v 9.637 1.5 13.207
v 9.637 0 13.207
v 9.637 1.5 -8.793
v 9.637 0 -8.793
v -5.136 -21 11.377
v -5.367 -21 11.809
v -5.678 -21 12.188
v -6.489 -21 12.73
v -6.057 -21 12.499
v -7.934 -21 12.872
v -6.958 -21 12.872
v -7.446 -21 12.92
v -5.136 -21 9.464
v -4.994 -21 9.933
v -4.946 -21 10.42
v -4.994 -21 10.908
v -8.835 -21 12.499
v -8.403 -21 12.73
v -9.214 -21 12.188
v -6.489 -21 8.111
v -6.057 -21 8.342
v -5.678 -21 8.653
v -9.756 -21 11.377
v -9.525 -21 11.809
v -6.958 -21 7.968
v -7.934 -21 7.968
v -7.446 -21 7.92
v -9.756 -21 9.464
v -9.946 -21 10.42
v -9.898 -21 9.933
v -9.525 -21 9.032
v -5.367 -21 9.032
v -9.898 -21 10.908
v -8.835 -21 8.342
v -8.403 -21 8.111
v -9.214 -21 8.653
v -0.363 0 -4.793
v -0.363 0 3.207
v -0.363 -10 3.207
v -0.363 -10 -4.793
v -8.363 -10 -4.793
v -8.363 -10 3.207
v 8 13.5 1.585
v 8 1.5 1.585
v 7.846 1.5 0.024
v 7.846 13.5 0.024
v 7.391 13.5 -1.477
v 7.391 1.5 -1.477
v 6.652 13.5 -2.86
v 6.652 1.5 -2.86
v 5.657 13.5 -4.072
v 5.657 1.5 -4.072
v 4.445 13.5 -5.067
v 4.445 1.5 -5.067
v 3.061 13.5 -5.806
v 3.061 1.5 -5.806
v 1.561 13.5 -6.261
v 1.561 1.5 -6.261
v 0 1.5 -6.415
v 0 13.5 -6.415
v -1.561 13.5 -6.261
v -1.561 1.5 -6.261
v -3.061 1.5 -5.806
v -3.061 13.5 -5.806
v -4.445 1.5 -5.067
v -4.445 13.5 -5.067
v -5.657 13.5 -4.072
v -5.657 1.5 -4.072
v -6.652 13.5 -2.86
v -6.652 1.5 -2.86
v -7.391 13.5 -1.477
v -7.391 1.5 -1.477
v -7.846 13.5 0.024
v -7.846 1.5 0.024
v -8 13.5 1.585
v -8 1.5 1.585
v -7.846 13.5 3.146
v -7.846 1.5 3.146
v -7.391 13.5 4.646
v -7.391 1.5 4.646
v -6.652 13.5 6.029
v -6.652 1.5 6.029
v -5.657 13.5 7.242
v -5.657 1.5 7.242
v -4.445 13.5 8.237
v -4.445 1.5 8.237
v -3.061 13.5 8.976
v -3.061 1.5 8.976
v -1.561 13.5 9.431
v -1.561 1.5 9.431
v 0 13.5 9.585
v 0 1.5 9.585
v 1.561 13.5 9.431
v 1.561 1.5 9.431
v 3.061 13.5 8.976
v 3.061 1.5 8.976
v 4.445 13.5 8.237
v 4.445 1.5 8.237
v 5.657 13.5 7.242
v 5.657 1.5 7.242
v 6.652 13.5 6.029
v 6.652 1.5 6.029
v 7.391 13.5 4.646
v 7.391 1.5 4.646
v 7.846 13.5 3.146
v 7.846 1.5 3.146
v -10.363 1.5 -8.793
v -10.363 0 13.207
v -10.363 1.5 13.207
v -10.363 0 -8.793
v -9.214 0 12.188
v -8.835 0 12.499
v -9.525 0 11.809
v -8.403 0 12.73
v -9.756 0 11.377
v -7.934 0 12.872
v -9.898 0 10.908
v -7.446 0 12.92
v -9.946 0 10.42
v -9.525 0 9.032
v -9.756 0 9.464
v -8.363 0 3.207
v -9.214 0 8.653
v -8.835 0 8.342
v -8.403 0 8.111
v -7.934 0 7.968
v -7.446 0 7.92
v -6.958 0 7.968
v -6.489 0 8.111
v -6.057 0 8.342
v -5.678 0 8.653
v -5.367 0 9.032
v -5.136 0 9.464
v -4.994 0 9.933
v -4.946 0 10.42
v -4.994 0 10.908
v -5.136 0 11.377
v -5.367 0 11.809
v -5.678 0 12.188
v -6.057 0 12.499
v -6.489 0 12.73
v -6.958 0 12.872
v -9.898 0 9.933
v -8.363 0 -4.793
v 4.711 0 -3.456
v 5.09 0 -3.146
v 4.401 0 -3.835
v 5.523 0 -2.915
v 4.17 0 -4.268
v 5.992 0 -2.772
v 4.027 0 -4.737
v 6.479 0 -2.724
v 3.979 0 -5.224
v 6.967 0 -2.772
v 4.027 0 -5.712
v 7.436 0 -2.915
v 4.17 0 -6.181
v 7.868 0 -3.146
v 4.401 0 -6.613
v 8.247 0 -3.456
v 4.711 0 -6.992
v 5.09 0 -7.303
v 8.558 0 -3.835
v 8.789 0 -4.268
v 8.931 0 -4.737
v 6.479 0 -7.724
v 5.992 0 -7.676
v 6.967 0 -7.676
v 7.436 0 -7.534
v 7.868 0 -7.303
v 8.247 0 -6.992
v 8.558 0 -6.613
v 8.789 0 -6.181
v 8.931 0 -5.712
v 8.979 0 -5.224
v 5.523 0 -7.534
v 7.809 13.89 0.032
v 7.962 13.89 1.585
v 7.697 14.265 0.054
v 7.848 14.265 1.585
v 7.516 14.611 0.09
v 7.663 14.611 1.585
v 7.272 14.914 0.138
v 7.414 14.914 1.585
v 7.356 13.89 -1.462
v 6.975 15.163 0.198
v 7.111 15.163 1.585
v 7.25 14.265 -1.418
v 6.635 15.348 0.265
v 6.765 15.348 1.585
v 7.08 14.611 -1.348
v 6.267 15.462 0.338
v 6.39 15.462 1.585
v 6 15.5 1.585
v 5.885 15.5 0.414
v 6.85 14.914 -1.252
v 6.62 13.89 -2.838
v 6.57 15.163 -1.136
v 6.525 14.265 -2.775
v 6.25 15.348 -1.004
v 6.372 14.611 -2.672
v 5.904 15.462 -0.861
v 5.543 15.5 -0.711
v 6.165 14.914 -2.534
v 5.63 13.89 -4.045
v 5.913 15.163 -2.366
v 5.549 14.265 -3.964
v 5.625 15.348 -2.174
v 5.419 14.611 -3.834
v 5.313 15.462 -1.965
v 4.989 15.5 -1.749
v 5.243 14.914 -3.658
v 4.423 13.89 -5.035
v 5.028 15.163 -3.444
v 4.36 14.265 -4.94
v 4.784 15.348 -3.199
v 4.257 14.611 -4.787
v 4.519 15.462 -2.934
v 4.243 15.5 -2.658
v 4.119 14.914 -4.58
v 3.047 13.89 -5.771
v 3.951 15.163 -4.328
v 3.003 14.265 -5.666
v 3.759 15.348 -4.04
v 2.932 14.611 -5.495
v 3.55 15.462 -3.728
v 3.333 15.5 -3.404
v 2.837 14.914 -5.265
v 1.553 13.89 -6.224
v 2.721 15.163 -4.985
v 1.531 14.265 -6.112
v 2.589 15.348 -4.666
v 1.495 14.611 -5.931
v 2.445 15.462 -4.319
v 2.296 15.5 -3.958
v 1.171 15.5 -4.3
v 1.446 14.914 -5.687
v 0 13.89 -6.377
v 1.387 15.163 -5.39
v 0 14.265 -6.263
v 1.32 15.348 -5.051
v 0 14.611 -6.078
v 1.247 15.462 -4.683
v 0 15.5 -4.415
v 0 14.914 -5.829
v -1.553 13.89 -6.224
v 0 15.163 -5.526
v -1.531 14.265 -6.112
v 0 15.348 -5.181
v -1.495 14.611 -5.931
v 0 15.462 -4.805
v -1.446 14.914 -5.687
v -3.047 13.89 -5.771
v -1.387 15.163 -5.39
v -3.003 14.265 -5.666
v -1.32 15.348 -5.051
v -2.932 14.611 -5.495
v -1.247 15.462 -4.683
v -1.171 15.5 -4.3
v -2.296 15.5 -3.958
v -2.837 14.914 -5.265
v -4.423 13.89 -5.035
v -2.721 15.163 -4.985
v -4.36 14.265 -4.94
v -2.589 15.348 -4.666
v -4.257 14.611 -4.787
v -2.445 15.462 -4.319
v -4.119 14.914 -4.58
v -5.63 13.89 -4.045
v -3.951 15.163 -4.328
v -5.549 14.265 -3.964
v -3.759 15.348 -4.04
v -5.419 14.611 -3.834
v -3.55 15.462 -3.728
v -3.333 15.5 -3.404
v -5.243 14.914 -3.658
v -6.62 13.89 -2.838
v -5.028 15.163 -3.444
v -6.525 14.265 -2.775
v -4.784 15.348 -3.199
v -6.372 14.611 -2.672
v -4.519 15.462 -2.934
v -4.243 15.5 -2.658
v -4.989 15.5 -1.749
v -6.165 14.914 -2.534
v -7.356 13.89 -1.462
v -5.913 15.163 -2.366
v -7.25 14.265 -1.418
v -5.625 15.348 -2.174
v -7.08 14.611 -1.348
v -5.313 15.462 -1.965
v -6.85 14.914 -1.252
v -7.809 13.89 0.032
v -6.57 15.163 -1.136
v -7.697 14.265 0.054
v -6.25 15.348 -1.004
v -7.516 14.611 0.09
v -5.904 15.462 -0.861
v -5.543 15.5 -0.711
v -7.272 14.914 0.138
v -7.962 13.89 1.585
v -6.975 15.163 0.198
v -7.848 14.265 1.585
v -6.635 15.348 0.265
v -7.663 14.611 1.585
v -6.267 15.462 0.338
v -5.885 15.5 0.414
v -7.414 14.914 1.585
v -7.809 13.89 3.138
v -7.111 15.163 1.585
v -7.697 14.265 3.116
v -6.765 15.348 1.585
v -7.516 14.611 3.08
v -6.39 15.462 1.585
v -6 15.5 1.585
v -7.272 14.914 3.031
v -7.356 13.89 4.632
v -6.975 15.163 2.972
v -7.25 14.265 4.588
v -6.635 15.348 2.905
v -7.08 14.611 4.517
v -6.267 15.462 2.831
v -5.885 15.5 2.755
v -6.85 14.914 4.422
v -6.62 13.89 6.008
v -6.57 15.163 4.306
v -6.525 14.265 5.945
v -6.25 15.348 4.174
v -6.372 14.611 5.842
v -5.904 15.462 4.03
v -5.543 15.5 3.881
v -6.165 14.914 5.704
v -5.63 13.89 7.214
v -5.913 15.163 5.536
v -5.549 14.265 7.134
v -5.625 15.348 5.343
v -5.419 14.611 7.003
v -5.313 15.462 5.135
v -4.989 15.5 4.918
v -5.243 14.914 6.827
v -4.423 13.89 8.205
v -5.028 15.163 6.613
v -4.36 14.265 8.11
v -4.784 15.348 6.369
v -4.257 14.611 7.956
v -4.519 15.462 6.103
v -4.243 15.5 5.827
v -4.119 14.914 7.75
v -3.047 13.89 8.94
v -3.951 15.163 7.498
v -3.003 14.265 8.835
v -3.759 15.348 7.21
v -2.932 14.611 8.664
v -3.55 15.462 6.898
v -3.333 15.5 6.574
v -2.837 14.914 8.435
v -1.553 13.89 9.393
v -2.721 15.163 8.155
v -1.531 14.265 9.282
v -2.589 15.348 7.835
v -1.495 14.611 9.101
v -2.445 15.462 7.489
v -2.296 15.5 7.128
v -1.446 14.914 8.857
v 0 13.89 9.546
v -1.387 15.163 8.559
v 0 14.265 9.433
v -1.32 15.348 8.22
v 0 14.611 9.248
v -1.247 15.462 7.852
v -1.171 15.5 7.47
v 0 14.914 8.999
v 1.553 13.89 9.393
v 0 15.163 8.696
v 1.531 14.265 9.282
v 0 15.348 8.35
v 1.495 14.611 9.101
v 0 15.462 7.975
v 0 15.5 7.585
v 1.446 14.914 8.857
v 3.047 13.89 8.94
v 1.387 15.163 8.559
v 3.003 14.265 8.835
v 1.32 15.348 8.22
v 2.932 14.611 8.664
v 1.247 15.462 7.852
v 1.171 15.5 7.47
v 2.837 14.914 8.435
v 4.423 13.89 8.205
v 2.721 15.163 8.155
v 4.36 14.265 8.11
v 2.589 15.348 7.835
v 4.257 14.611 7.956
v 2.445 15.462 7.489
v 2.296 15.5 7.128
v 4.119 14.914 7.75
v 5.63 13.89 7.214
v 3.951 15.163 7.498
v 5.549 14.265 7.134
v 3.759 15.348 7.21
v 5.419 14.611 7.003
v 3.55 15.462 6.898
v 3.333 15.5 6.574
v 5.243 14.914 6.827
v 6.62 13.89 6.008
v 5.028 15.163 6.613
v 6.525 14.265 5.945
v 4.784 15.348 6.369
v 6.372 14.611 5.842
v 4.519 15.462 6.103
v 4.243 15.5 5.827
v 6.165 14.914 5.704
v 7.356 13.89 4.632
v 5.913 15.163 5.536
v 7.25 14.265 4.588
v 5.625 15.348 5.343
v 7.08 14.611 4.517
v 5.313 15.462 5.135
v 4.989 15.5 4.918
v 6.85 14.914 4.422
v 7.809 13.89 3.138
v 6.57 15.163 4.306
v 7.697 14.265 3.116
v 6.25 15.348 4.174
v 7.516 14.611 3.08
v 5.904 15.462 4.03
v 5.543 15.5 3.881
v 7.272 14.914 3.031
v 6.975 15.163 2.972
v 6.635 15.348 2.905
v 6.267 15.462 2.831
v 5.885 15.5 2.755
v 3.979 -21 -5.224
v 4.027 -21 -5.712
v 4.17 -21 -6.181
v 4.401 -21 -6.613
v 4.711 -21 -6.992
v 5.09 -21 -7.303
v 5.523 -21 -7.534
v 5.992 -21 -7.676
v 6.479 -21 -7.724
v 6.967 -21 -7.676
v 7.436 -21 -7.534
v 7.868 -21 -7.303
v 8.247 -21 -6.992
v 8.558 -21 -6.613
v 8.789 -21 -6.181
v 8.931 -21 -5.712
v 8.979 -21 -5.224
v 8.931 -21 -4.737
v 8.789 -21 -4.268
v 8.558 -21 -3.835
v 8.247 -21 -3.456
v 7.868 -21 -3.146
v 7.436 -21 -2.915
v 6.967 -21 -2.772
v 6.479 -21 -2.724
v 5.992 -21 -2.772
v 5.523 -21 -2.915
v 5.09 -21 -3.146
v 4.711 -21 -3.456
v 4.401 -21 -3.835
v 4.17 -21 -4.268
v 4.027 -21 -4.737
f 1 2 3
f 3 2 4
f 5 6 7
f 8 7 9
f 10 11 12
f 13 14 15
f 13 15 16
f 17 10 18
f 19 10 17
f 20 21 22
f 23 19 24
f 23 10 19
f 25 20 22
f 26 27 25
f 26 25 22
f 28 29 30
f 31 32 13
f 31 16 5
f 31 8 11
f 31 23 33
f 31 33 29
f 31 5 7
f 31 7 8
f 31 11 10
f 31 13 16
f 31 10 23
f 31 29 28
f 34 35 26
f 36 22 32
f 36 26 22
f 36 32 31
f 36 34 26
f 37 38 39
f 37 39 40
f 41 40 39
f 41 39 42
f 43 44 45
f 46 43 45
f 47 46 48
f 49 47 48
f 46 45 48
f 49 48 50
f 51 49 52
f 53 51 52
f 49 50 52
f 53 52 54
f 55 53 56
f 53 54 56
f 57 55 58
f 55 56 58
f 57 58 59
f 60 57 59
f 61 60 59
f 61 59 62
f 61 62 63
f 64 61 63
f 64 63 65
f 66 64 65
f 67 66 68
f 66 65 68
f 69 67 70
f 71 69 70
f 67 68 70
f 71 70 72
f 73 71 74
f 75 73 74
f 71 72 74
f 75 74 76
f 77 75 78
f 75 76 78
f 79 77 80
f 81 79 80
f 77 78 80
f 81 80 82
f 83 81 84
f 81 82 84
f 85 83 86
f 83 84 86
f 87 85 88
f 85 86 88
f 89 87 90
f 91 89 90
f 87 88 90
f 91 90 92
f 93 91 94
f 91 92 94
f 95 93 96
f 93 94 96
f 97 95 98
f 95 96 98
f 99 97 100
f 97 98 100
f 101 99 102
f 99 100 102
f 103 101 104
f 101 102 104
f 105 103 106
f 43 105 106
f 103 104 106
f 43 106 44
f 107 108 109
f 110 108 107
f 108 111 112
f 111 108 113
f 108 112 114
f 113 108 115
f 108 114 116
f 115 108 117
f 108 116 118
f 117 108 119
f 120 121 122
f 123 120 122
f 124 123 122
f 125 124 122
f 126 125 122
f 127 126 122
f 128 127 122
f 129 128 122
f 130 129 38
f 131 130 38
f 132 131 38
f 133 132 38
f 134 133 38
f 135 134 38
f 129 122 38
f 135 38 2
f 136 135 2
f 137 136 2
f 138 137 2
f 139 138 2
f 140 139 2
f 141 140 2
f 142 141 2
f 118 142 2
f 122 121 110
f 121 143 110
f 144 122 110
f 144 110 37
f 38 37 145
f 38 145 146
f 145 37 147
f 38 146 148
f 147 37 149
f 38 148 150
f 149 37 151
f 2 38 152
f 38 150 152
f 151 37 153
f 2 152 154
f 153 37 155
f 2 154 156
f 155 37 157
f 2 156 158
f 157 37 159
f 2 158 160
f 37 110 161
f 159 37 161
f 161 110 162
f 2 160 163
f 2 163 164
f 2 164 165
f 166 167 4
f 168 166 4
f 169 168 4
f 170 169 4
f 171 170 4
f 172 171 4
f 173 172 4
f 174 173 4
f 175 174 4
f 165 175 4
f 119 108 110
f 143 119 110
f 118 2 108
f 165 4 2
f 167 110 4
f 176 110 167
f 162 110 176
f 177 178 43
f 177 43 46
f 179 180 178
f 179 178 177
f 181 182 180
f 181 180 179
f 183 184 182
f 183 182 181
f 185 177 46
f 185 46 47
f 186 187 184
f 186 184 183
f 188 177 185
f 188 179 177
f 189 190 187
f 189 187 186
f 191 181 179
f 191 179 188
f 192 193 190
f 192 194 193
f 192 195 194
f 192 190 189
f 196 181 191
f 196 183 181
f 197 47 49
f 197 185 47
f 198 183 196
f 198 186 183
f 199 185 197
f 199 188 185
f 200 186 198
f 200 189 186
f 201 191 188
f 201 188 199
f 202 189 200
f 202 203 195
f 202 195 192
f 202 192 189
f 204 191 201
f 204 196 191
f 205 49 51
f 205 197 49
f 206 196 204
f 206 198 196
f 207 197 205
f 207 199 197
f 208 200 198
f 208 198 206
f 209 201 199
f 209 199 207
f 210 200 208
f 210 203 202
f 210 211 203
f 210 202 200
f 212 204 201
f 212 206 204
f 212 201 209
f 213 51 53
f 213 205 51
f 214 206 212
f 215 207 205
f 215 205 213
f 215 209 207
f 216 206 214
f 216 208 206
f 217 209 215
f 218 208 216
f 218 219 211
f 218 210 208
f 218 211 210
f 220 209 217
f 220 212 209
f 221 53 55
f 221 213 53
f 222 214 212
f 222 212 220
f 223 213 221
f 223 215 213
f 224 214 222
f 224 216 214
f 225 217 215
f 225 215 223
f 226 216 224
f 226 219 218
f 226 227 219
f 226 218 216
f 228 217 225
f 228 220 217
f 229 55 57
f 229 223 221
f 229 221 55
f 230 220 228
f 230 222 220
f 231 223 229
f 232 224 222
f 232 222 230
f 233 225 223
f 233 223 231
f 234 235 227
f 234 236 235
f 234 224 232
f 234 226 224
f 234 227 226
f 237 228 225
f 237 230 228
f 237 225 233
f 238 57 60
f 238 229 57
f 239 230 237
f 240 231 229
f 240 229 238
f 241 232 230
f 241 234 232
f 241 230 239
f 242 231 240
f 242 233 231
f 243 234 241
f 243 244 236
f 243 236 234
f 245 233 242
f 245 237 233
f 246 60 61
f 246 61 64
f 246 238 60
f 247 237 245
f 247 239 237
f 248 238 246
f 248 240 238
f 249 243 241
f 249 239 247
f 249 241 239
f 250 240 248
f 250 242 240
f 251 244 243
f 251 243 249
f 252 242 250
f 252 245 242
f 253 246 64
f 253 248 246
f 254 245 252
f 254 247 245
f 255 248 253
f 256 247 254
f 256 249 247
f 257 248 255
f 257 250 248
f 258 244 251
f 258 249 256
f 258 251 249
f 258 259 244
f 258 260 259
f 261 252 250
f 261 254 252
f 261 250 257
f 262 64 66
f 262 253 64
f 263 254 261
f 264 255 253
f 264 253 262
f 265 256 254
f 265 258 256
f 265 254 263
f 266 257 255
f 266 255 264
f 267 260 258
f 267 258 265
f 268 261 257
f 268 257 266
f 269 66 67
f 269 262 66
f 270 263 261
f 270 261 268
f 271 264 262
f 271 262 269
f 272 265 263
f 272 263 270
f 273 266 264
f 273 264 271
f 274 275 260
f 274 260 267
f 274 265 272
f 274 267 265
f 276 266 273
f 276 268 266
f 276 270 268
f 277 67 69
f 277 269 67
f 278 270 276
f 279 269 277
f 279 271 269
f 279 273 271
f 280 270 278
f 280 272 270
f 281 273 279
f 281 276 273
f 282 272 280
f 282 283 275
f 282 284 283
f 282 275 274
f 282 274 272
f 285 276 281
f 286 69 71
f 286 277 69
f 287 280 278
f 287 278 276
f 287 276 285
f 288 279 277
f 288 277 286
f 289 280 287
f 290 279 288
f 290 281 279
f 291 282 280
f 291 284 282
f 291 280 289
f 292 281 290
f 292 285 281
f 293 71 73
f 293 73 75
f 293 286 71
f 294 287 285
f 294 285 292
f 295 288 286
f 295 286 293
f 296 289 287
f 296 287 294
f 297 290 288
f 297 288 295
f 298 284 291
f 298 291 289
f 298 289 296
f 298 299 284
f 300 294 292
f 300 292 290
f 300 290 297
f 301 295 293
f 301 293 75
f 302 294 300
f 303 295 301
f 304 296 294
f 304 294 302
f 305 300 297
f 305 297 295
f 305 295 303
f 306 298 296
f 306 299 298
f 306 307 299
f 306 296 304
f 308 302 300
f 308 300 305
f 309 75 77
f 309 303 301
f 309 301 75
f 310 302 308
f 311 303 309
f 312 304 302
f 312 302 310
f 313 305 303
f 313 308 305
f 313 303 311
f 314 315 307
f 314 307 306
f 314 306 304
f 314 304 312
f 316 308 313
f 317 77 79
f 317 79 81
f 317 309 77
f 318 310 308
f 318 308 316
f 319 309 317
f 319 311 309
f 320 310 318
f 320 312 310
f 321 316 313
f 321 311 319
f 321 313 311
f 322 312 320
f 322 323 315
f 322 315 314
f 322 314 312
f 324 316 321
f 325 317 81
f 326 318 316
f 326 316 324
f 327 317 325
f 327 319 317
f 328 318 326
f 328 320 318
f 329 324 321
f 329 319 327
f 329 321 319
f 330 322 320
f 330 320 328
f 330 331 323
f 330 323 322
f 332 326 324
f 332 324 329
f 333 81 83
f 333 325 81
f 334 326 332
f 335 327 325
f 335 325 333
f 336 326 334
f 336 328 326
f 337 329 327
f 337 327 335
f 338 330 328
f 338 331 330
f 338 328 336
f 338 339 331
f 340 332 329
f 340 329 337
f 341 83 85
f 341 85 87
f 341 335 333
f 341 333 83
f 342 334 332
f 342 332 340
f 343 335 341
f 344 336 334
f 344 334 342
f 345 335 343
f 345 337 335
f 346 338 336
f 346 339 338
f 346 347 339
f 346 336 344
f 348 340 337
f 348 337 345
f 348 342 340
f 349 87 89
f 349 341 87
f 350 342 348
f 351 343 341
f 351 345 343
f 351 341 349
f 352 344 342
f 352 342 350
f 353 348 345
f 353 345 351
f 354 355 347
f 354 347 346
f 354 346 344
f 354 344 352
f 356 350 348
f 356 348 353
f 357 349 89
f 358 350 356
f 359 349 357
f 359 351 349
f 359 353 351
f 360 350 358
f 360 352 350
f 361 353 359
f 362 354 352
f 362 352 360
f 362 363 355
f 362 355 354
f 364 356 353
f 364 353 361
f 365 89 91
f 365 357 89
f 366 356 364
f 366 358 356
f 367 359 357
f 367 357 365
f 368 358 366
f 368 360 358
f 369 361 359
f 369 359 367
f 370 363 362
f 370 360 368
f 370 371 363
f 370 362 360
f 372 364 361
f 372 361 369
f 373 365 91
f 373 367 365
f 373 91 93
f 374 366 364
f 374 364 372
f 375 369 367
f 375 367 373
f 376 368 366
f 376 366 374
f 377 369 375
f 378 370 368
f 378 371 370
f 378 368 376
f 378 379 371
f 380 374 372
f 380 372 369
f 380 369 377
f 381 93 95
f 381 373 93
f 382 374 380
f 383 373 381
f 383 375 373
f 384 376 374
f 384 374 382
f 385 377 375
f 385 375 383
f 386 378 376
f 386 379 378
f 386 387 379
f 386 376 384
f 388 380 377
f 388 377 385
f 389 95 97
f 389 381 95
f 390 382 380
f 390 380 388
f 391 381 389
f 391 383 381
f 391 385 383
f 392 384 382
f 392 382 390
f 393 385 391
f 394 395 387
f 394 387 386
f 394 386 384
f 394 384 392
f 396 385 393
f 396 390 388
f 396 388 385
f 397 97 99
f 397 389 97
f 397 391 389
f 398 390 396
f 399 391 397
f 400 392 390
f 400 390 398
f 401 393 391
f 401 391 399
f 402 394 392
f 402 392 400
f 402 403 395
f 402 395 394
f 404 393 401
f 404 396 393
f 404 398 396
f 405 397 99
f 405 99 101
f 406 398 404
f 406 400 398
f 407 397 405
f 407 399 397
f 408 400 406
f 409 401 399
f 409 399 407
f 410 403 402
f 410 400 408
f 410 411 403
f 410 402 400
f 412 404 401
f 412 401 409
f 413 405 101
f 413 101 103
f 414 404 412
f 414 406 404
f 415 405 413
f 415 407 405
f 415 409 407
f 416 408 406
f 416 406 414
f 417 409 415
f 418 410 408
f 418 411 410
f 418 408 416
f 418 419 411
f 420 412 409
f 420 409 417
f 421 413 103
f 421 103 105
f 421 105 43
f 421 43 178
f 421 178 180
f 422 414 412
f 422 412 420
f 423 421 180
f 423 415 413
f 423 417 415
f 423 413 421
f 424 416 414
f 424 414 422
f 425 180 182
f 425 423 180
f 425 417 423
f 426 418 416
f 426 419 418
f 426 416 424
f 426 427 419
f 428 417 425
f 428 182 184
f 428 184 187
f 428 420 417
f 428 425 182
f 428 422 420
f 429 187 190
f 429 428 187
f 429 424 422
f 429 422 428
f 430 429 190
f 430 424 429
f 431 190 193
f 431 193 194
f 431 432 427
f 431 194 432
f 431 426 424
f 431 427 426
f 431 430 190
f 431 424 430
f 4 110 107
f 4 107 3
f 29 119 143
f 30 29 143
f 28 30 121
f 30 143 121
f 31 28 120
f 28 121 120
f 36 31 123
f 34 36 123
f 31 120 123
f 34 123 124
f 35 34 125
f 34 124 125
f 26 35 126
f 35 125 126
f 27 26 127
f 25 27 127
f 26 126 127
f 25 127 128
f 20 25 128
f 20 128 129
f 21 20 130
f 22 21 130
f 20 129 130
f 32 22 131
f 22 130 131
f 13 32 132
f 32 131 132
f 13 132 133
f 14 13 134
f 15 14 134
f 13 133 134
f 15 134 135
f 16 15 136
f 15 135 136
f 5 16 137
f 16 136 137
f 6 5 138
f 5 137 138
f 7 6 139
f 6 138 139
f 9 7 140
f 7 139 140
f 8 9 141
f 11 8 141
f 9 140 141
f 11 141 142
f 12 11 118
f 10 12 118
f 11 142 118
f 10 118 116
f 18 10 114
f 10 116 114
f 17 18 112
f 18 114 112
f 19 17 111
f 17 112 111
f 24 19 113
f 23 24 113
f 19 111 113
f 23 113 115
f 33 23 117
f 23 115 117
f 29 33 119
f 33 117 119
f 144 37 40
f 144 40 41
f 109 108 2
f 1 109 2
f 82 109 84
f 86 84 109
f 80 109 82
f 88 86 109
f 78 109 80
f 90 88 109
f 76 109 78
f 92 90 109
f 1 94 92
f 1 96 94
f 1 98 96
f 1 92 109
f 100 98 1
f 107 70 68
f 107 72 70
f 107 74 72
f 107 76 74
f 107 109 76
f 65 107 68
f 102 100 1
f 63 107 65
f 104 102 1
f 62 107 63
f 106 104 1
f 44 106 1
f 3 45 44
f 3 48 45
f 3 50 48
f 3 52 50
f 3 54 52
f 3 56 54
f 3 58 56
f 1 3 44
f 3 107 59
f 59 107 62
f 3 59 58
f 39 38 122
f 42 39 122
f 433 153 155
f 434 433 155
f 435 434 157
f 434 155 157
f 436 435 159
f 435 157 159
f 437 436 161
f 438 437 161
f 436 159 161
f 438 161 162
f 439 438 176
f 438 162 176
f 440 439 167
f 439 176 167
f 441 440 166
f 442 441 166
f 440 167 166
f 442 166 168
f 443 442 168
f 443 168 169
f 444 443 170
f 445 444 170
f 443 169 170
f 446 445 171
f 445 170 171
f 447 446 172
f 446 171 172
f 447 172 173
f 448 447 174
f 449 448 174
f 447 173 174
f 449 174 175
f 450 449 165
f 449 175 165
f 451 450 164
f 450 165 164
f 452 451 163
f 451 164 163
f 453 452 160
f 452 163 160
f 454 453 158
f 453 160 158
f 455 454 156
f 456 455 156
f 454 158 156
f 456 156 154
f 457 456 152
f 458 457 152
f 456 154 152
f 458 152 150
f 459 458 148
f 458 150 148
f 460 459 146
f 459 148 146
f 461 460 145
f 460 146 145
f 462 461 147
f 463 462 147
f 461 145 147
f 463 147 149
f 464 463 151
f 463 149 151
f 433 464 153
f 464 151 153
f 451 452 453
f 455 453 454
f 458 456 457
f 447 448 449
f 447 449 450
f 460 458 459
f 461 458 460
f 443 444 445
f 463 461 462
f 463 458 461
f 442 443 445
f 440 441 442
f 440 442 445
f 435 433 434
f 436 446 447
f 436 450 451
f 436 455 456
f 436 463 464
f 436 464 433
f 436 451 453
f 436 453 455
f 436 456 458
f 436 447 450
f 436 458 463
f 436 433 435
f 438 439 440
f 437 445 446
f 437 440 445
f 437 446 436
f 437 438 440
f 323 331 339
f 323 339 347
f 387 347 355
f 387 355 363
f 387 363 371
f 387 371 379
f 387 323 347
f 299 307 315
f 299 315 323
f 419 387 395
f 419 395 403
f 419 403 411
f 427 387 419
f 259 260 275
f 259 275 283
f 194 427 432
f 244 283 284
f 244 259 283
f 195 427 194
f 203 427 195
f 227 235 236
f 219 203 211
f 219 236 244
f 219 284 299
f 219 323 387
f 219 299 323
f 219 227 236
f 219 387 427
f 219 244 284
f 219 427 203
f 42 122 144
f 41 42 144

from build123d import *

# Parameters (mm, degrees)
ESBO_O1_W                = 20
ESBO_O1_H                = 22
RESSALTO_EXTRUS_O1_DEPTH = 1.5
ESBO_O2_R                = 8
RESSALTO_EXTRUS_O2_DEPTH = 14
FILETE1_R                = 2
ESBO_O3_R                = 2.5
RESSALTO_EXTRUS_O3_DEPTH = 21
ESBO_O4_W                = 8
ESBO_O4_H                = 8
RESSALTO_EXTRUS_O4_DEPTH = 10


with BuildPart() as part:
    # Esboço1 → Ressalto-extrusão1 (new body)
    with BuildSketch(Plane(origin=(0, 0, 0), x_dir=(1, 0, 0), z_dir=(0, 1, 0))):
        with Locations((-0.363033398, -2.207136461)):
            Rectangle(ESBO_O1_W, ESBO_O1_H)
    extrude(amount=RESSALTO_EXTRUS_O1_DEPTH)

    # Esboço2 → Ressalto-extrusão2 (add)
    with BuildSketch(Plane(origin=(0, 1.5, 0), x_dir=(1, 0, 0), z_dir=(0, 1, 0))):
        with Locations((0, -1.584818961)):
            Circle(ESBO_O2_R)
    extrude(amount=RESSALTO_EXTRUS_O2_DEPTH)

    # Filete1
    filete1_edges = [part.edges().sort_by_distance(p)[0] for p in [
        (-8, 15.5, 1.584818961),
    ]]
    fillet(filete1_edges, radius=FILETE1_R)

    # Esboço3 → Ressalto-extrusão3 (add)
    with BuildSketch(Plane(origin=(0, 0, 0), x_dir=(-1, 0, 0), z_dir=(0, -1, 0))):
        with Locations((7.446149428, -10.420452969)):
            Circle(ESBO_O3_R)
        with Locations((-6.479235285, 5.224259997)):
            Circle(ESBO_O3_R)
    extrude(amount=RESSALTO_EXTRUS_O3_DEPTH)

    # Esboço4 → Ressalto-extrusão4 (add)
    with BuildSketch(Plane(origin=(0, 0, 0), x_dir=(-1, 0, 0), z_dir=(0, -1, 0))):
        with Locations((4.363033398, 0.792863539)):
            Rectangle(ESBO_O4_W, ESBO_O4_H)
    extrude(amount=RESSALTO_EXTRUS_O4_DEPTH)


solid = part.part
